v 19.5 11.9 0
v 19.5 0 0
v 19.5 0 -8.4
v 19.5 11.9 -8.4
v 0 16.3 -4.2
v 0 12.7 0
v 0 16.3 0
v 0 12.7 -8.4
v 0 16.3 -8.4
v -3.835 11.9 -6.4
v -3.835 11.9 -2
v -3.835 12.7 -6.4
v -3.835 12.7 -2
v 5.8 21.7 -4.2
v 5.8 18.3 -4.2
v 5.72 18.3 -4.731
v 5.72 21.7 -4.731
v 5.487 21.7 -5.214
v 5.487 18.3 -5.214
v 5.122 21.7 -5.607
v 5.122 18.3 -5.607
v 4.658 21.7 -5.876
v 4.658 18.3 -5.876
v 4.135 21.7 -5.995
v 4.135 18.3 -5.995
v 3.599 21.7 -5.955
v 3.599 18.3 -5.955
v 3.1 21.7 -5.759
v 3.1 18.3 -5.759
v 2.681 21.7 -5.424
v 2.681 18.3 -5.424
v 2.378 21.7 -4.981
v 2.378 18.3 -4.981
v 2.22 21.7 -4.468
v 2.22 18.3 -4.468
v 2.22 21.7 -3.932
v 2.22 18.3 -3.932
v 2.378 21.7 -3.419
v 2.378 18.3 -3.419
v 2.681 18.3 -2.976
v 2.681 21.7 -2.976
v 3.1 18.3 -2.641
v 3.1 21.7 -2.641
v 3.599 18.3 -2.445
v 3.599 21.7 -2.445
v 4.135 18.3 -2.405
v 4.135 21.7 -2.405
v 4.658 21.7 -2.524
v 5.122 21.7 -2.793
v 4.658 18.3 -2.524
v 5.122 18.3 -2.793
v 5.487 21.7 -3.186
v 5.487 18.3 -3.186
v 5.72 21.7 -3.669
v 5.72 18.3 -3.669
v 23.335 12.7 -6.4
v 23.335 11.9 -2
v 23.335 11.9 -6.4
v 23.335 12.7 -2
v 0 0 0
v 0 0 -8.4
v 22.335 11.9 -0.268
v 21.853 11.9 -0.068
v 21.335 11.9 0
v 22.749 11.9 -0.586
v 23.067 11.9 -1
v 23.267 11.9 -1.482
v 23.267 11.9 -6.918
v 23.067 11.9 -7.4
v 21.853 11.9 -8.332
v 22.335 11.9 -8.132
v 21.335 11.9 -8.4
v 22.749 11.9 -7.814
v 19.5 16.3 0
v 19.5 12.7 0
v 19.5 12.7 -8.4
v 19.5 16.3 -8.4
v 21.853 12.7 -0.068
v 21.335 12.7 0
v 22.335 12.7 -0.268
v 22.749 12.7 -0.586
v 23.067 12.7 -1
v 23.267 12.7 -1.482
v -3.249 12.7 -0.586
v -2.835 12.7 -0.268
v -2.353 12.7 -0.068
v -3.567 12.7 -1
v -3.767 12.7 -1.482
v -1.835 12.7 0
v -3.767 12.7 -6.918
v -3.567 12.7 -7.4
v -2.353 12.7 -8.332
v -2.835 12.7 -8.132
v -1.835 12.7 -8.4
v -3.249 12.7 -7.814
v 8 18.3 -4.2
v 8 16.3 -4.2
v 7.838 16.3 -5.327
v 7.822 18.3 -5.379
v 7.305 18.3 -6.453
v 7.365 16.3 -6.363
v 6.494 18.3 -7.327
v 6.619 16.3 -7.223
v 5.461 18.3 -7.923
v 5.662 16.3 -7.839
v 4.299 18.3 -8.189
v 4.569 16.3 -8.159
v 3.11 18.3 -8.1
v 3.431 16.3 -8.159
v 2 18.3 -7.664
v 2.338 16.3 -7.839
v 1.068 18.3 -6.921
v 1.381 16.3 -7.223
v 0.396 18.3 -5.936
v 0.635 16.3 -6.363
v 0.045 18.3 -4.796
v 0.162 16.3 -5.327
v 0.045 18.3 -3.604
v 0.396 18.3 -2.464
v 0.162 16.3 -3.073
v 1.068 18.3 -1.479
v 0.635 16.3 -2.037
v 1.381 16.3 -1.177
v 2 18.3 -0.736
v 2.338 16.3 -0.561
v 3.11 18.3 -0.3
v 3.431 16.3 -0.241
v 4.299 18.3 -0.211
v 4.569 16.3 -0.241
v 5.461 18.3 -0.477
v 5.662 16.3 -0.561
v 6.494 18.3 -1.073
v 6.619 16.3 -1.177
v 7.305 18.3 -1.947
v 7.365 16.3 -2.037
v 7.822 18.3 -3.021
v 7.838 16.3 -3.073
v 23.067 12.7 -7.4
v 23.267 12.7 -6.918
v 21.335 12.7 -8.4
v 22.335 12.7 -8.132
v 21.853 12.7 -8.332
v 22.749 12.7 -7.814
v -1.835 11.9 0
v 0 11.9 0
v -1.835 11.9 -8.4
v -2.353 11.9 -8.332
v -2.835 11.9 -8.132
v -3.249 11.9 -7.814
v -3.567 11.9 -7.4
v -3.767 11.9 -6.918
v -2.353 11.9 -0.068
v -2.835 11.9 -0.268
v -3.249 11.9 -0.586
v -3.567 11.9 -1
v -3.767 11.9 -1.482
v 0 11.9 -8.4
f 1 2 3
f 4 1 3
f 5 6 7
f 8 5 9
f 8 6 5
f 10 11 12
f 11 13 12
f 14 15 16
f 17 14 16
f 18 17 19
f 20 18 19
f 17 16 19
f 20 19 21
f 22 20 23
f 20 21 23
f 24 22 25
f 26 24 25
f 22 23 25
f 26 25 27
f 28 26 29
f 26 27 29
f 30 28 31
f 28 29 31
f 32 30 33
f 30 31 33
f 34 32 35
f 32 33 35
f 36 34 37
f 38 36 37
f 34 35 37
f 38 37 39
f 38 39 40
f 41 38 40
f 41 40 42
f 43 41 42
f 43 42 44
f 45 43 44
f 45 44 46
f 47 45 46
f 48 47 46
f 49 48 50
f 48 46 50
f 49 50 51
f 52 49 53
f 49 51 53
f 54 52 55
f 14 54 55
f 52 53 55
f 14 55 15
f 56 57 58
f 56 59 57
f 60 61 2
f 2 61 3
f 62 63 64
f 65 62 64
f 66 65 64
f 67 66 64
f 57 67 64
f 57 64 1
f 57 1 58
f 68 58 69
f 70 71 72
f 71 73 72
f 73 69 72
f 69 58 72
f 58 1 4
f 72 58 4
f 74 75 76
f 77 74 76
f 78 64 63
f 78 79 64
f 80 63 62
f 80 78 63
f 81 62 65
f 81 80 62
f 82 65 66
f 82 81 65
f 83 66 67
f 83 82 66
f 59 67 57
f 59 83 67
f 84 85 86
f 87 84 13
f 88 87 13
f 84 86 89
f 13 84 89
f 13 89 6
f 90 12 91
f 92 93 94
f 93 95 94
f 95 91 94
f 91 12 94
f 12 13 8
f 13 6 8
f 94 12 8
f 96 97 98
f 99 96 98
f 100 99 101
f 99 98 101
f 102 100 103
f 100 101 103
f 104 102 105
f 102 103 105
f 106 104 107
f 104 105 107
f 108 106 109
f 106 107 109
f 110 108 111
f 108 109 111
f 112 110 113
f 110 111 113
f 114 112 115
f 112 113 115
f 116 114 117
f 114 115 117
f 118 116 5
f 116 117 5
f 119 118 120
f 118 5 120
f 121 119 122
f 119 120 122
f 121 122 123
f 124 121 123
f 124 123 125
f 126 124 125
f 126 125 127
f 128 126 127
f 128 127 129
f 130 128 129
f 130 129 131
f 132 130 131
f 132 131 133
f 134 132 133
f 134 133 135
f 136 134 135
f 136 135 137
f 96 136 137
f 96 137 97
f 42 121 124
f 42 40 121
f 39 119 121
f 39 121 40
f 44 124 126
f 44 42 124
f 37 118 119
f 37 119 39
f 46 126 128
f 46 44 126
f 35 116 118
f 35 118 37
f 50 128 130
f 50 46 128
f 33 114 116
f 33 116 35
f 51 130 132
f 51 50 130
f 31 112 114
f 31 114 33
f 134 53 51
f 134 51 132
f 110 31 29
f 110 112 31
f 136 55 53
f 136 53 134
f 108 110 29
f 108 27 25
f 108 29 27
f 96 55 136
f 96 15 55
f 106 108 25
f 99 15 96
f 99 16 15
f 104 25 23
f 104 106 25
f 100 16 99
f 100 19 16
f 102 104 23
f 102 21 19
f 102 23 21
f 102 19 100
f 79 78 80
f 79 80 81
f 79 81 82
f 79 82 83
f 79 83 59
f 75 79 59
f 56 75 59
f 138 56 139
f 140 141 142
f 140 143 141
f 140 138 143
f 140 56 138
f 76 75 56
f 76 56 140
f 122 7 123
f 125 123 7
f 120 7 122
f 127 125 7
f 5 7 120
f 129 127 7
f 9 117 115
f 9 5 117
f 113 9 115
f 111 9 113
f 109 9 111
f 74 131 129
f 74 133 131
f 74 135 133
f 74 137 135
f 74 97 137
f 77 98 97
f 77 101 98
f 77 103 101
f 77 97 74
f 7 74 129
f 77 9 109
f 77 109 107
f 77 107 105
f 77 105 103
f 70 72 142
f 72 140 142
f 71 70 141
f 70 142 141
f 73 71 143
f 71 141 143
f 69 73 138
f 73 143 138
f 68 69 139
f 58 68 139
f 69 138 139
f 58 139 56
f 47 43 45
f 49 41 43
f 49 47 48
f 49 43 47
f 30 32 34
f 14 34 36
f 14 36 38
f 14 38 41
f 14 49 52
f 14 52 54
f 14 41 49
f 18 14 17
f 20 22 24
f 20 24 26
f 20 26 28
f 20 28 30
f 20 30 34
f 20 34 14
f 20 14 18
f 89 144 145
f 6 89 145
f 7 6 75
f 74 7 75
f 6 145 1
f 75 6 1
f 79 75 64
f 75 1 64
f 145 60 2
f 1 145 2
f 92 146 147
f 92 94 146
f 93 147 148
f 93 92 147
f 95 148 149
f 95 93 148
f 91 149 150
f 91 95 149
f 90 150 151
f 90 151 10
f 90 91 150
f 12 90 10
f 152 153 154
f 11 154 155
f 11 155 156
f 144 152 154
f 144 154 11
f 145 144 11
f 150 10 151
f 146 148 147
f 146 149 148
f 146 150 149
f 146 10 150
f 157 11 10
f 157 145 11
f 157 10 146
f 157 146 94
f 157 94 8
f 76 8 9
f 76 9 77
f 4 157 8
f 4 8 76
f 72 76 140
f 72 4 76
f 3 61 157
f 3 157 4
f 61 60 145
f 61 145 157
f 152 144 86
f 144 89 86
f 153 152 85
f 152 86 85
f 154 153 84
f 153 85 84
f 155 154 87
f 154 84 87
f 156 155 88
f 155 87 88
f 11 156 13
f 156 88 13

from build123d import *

# Parameters (mm, degrees)
SKETCH1_W           = 19.5
SKETCH1_H           = 8.4
BOSS_EXTRUDE1_DEPTH = 16.3
SKETCH2_R           = 4
BOSS_EXTRUDE2_DEPTH = 2
SKETCH3_W           = 8.4
SKETCH3_H           = 0.8
BOSS_EXTRUDE3_DEPTH = 3.835
FILLET1_R           = 2
FILLET2_R           = 2
SKETCH4_R           = 1.8
BOSS_EXTRUDE4_DEPTH = 3.4


with BuildPart() as part:
    # Sketch1 → Boss-Extrude1 (new body)
    with BuildSketch(Plane(origin=(0, 0, 0), x_dir=(1, 0, 0), z_dir=(0, 1, 0))):
        with Locations((9.75, 4.2)):
            Rectangle(SKETCH1_W, SKETCH1_H)
    extrude(amount=BOSS_EXTRUDE1_DEPTH)

    # Sketch2 → Boss-Extrude2 (add)
    with BuildSketch(Plane(origin=(0, 16.3, 0), x_dir=(1, 0, 0), z_dir=(0, 1, 0))):
        with Locations((4, 4.2)):
            Circle(SKETCH2_R)
    extrude(amount=BOSS_EXTRUDE2_DEPTH)

    # Sketch3 → Boss-Extrude3 (add)
    with BuildSketch(Plane(origin=(19.5, 0, 0), x_dir=(0, 0, -1), z_dir=(1, 0, 0))):
        with Locations((4.2, 12.3)):
            Rectangle(SKETCH3_W, SKETCH3_H)
    boss_extrude3 = extrude(amount=BOSS_EXTRUDE3_DEPTH)

    # Fillet1
    fillet1_edges = [part.edges().sort_by_distance(p)[0] for p in [
        (23.335, 12.3, 0),
        (23.335, 12.3, -8.4),
    ]]
    fillet(fillet1_edges, radius=FILLET1_R)

    # Mirror1: Boss-Extrude3 across plane
    add(boss_extrude3.mirror(Plane(origin=(9.75, 0, 0), x_dir=(0, 0, 1), z_dir=(1, 0, 0))))

    # Fillet2
    fillet2_edges = [part.edges().sort_by_distance(p)[0] for p in [
        (-3.835, 12.3, 0),
        (-3.835, 12.3, -8.4),
    ]]
    fillet(fillet2_edges, radius=FILLET2_R)

    # Sketch4 → Boss-Extrude4 (add)
    with BuildSketch(Plane(origin=(0, 18.3, 0), x_dir=(1, 0, 0), z_dir=(0, 1, 0))):
        with Locations((4, 4.2)):
            Circle(SKETCH4_R)
    extrude(amount=BOSS_EXTRUDE4_DEPTH)


solid = part.part
